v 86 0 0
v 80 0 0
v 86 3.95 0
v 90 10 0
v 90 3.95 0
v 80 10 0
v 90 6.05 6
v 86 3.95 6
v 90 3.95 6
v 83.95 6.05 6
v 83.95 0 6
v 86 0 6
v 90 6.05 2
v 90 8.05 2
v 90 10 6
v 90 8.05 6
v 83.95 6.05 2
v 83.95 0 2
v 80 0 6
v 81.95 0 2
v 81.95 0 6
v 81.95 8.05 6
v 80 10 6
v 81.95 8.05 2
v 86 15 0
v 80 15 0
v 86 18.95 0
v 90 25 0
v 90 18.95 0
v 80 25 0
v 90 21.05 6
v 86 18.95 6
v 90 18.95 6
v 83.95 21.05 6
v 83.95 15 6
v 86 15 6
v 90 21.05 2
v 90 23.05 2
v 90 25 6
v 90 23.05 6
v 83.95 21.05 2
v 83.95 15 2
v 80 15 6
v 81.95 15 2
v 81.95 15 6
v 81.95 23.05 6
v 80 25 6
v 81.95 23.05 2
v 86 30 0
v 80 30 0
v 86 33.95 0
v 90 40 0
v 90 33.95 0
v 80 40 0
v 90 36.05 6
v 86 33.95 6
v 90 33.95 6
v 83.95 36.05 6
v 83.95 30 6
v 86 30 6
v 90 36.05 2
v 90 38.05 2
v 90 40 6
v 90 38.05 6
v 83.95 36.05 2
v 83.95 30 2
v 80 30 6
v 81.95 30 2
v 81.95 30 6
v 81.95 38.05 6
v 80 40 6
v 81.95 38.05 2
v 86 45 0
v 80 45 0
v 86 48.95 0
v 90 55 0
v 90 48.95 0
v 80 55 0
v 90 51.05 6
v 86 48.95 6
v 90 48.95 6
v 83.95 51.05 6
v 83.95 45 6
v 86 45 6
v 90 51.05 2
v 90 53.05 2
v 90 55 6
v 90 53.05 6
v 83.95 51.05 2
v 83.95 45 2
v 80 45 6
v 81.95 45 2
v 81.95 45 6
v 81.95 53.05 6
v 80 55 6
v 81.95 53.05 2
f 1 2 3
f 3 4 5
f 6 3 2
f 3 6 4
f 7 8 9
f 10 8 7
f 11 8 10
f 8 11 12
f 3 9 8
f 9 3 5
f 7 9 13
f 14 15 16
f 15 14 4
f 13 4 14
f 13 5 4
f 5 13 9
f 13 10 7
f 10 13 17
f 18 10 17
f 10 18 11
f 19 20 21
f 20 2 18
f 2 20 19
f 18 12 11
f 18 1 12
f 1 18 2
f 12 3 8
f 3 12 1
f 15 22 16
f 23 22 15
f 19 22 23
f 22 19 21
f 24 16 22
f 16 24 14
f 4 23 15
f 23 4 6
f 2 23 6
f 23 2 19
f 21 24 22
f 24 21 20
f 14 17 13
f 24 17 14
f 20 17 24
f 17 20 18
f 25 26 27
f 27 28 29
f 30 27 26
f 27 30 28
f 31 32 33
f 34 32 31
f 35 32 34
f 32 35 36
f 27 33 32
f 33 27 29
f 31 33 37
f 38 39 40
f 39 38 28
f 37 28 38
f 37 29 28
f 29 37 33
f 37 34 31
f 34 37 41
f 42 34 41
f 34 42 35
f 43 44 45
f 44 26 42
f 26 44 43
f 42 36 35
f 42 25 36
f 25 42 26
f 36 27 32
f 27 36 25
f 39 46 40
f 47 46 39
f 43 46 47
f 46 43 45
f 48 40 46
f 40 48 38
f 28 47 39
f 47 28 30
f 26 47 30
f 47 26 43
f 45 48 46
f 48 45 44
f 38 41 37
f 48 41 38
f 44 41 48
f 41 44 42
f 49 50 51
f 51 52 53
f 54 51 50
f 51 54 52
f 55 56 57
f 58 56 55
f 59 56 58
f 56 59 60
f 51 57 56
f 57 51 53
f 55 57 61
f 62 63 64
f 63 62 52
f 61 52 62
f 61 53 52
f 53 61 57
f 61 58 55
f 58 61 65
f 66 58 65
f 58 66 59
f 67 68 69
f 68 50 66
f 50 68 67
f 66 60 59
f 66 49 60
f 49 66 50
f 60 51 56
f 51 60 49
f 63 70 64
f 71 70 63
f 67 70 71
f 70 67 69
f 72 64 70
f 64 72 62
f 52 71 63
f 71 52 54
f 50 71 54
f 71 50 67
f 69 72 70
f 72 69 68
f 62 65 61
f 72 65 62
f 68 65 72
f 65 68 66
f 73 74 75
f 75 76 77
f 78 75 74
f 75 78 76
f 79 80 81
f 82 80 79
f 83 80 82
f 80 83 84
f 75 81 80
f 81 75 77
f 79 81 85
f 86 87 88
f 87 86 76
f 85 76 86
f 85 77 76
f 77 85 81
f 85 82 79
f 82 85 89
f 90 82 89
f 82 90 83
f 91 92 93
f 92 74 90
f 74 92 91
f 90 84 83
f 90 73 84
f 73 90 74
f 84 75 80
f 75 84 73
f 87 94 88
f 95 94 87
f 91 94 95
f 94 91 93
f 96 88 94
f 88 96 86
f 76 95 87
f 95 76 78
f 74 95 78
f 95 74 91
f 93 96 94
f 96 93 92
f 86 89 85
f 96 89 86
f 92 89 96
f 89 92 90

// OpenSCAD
clipHeightAboveWall = 4.00 ; // mm
towerHeight=120 ; // mm
towerDepth=70 ; // mm
towerWidth=70 ; // mm
wallThickness = 2.00 ; // mm
baffleThickness = 1.50 ; // mm
baffleDepth     = towerDepth/2.00 ; // = 35.00 ; //mm;
baffle1BelowTop = 5 ;
diceOpening = 26 ; // mm

printOption = "C" ; // S=Sides, F=Front and Back, B=Baffles, C=Clips, T=Tray, Q=Base

baffle1poly = [ [0, 0],[baffleDepth, 0],[baffleDepth, 2*baffleThickness],
                [baffleDepth-2*baffleThickness,baffleThickness],[0, baffleThickness]] ;

baseClippoly = [ [0, 0],[baffleDepth, 0],[baffleDepth, wallThickness],
                 [0, wallThickness]] ;

module genShape(shapeWidth,ShapeOutline) {
        linear_extrude(shapeWidth) polygon(points=ShapeOutline ) ;
}

module towerFront(towerWidth, towerHeight, wallThickness,diceOpening) {

difference() {
    cube([towerWidth+2*wallThickness,towerHeight, wallThickness]) ;
    translate([5+wallThickness,-.01,-.01])cube([towerWidth-2*5, diceOpening+.02, wallThickness+.02]) ;
} 
}

module towerBack(towerWidth, towerHeight, wallThickness, towerDepth) {

    cube([towerWidth+2*wallThickness,towerHeight, wallThickness]) ;
 
}

module towerSideLeft(towerDepth, towerHeight, wallThickness) {
    //side plate
    cube([towerDepth, towerHeight, wallThickness]) ;
    //baffle clips
    translate([17.5,towerHeight-5-baffle1BelowTop-2*1.5/cos(60),0])baffleClip(clipWidth=35, rotateAngle=30) ;
    translate([17.5,towerHeight-60-baffle1BelowTop-2*1.5/cos(60),0])baffleClip(clipWidth=35, rotateAngle=30) ;
    translate([towerDepth-17.5,towerHeight-32-baffle1BelowTop-2*1.5/cos(60),0])baffleClip(clipWidth=30, rotateAngle=-30) ;
    translate([towerDepth-25,15,0])baffleClip(clipWidth=50, rotateAngle=-25) ;
}


module towerSideRight(towerDepth, towerHeight, wallThickness) {
    //side plate
    cube([towerDepth, towerHeight, wallThickness]) ;
    //baffle clips
        translate([towerDepth-17.5,towerHeight-5-baffle1BelowTop-2*1.5/cos(60),0])baffleClip(clipWidth=35, rotateAngle=-30) ;
        translate([towerDepth-17.5,towerHeight-60-baffle1BelowTop-2*1.5/cos(60),0])baffleClip(clipWidth=35, rotateAngle=-30) ;
        translate([17.5,towerHeight-32-baffle1BelowTop-2*1.5/cos(60),0])baffleClip(clipWidth=30, rotateAngle=30) ;
        translate([25,15,0])baffleClip(clipWidth=50, rotateAngle=30) ;
}

module towerBase(towerDepth,towerWidth, wallThickness){
    cornerSize=4.00 ; //mm
    cube([towerDepth+4*wallThickness, towerWidth+2*wallThickness, wallThickness]) ;
    translate([0,towerWidth-cornerSize-wallThickness,0])
        color("darkgrey") cornerClip(shapeWidth=cornerSize) ;
    translate([towerDepth-cornerSize+wallThickness,towerWidth+cornerSize,0]) rotate([0,0,-90])
        color("blue") cornerClip(shapeWidth=cornerSize) ;
    translate([cornerSize+3*wallThickness,0,0]) rotate([0,0,90])
        color("pink") cornerClip(shapeWidth=cornerSize) ;
    translate([towerDepth+4*wallThickness, cornerSize+3*wallThickness,0]) rotate([0,0,-180])
        color("yellow") cornerClip(shapeWidth=cornerSize) ;
    translate([(towerDepth+3*wallThickness-baffleDepth)/2,0.0*wallThickness,0]) 
        genShape(shapeWidth=4,ShapeOutline=baseClippoly) ;
    translate([(towerDepth+3*wallThickness-baffleDepth)/2,2.1*wallThickness,0]) 
        genShape(shapeWidth=4,ShapeOutline=baseClippoly) ;
    
    translate([(towerDepth+3*wallThickness-baffleDepth)/2,towerWidth+1.0*wallThickness,0]) 
        genShape(shapeWidth=4,ShapeOutline=baseClippoly) ;
    translate([(towerDepth+3*wallThickness-baffleDepth)/2,towerWidth-1.1*wallThickness,0]) 
        genShape(shapeWidth=4,ShapeOutline=baseClippoly) ;        

    translate([towerDepth-3.1*wallThickness+10, (towerDepth+3*wallThickness-baffleDepth)/2,0]) 
       rotate([0,0,90]) 
       color("cyan")genShape(shapeWidth=4,ShapeOutline=baseClippoly) ;
    translate([towerWidth-1*wallThickness+10,(towerDepth+3*wallThickness-baffleDepth)/2,0]) 
        rotate([0,0,90]) 
        color("blue")genShape(shapeWidth=4,ShapeOutline=baseClippoly) ;        
}

module cornerClip(shapeWidth) {

   //cornerClipPoints
    x0=0 ; x1=wallThickness-0.05; x2=2*wallThickness-0.05 ; x3= 3*wallThickness; x4=x3+clipHeightAboveWall ;
    y0=0 ; y1=x2 ; y2=x4-x2;y3=x4-x1; y4=x4 ;
    cornerClipPoints = [[x0,y0],[x1,y0],[x2,y0],[x3,y0],[x2,y2],[x4,y2],[x4,y1],[x3,y1],[x0,y4],[x4,y4],[x4,y3],[x1,y3]] ;
    //                     0       1       2       3       4       5       6       7       8       9       10      11

    shape1 = [[x2,y0],[x2,y2],[x4,y2],[x4,y1],[x3,y1],[x3,y0]];
    shape2 = [[x0,y0],[x0,y4],[x4,y4],[x4,y3],[x1,y3],[x1,y0]] ;
    shape3 = [[x0,y0],[x0,y4],[x4,y4],[x4,y1],[x3,y1],[x3,y0]] ;

    union() {
        genShape(shapeWidth=shapeWidth,ShapeOutline=shape1) ;
        genShape(shapeWidth=shapeWidth,ShapeOutline=shape2) ;
        genShape(shapeWidth=shapeWidth-clipHeightAboveWall,ShapeOutline=shape3) ;
    }
}

module baffleClip(clipWidth, rotateAngle) {
    rotate([0,0,-rotateAngle])
    translate([-clipWidth/2, -3*baffleThickness/2, 0])
    union() {translate([0,0,0])cube([clipWidth,3*baffleThickness,wallThickness]) ;
    translate([0,0,0])color("red")cube([baffleThickness,baffleThickness,wallThickness+clipHeightAboveWall]) ;
    translate([0,0,0])cube([clipWidth,baffleThickness,wallThickness+clipHeightAboveWall ]) ;
    translate([0,2*baffleThickness,0])cube([clipWidth,baffleThickness,wallThickness+clipHeightAboveWall ]) ;
    }
}


module baffle(baffleWidth,baffleOutline,ShapePoints) {

    cube([towerWidth, baffleDepth, baffleThickness]) ;
    translate([0,0,0]) cube([towerWidth, 2*baffleThickness, 2*baffleThickness]) ;
}

module exitRamp(shapeWidth,baffleThickness) {
    cube([60, shapeWidth, baffleThickness]) ;
 
}

if (printOption=="S") {
translate([-towerDepth-2,0,0])
towerSideLeft(towerDepth,towerHeight, wallThickness) ;

towerSideRight(towerDepth,towerHeight, wallThickness) ;
}
else if (printOption == "F") {
    translate([-towerWidth-2*wallThickness-3,0,0])towerFront(towerWidth, towerHeight, wallThickness,diceOpening) ;
    towerBack(towerWidth, towerHeight, wallThickness, towerDepth) ;
}
else if (printOption == "B") {
    color("brown") exitRamp(shapeWidth=towerWidth-0*wallThickness, baffleThickness=baffleThickness) ;
    translate([towerWidth,0,0]) color("cyan") baffle(baffleWidth=towerWidth,baffleOutline=baffle1poly) ;
    translate([towerWidth,baffleDepth+2,0]) color("white") baffle(baffleWidth=towerWidth,baffleOutline=baffle1poly) ;
    translate([towerWidth,2*baffleDepth+4,0]) color("grey") baffle(baffleWidth=towerWidth,baffleOutline=baffle1poly) ;
}
else if (printOption == "C") {
    translate([towerDepth+4*wallThickness+2,0,0]) cornerClip(shapeWidth=6) ;
    translate([towerDepth+4*wallThickness+2,15,0]) cornerClip(shapeWidth=6) ;
    translate([towerDepth+4*wallThickness+2,30,0]) cornerClip(shapeWidth=6) ;
    translate([towerDepth+4*wallThickness+2,45,0]) cornerClip(shapeWidth=6) ;
    
}
else if (printOption=="Q") {
    towerBase(towerDepth,towerWidth, wallThickness) ;
    
}
